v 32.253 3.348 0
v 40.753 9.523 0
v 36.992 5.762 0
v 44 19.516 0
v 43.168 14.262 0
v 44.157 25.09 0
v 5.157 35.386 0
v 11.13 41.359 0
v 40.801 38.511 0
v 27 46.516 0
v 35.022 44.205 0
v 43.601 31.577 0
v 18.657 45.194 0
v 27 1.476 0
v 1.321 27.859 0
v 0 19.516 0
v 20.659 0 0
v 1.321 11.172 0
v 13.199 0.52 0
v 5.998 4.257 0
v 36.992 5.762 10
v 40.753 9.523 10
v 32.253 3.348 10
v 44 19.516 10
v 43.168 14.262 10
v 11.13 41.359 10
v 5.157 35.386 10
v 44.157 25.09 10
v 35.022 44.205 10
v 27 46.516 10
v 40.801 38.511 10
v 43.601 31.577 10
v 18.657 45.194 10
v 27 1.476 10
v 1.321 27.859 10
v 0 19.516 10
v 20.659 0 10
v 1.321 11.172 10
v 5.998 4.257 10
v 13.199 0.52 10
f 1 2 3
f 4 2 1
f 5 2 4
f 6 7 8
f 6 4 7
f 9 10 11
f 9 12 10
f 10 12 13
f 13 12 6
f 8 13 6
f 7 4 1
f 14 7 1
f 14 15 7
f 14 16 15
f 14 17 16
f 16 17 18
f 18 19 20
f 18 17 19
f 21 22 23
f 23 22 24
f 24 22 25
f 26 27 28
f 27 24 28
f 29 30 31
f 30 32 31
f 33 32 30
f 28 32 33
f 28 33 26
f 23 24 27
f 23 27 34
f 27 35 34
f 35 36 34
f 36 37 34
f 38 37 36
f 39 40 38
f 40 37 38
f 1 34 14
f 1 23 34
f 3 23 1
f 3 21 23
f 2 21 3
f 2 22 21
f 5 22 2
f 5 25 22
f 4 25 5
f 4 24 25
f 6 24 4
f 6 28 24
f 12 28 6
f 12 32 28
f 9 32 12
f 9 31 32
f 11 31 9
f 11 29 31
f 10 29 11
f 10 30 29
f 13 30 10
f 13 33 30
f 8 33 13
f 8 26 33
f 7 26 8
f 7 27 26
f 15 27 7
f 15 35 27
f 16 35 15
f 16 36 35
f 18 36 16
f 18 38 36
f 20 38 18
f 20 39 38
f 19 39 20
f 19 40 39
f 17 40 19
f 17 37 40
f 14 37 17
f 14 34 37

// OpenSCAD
$fn = 32;

// ----------------------------------------------------------------------
// Cam disc: base radius 17.0 mm, lift 10.0 mm, 20 profile points
// ----------------------------------------------------------------------

// --- parameters (mm) ---
profile_height = 10;      // extrusion height
profile_points = 20;      // points of the closed outline

profile = [[44, 19.516], [44.157, 25.09], [43.601, 31.577], [40.801, 38.511], [35.022, 44.205], [27, 46.516], [18.657, 45.194], [11.13, 41.359], [5.157, 35.386], [1.321, 27.859], [0, 19.516], [1.321, 11.172], [5.998, 4.257], [13.199, 0.52], [20.659, 0], [27, 1.476], [32.253, 3.348], [36.992, 5.762], [40.753, 9.523], [43.168, 14.262]];  // single closed polygon, 20 points, counter clockwise

// --- the one profile operation ---
linear_extrude(height = profile_height) polygon(points = profile);
